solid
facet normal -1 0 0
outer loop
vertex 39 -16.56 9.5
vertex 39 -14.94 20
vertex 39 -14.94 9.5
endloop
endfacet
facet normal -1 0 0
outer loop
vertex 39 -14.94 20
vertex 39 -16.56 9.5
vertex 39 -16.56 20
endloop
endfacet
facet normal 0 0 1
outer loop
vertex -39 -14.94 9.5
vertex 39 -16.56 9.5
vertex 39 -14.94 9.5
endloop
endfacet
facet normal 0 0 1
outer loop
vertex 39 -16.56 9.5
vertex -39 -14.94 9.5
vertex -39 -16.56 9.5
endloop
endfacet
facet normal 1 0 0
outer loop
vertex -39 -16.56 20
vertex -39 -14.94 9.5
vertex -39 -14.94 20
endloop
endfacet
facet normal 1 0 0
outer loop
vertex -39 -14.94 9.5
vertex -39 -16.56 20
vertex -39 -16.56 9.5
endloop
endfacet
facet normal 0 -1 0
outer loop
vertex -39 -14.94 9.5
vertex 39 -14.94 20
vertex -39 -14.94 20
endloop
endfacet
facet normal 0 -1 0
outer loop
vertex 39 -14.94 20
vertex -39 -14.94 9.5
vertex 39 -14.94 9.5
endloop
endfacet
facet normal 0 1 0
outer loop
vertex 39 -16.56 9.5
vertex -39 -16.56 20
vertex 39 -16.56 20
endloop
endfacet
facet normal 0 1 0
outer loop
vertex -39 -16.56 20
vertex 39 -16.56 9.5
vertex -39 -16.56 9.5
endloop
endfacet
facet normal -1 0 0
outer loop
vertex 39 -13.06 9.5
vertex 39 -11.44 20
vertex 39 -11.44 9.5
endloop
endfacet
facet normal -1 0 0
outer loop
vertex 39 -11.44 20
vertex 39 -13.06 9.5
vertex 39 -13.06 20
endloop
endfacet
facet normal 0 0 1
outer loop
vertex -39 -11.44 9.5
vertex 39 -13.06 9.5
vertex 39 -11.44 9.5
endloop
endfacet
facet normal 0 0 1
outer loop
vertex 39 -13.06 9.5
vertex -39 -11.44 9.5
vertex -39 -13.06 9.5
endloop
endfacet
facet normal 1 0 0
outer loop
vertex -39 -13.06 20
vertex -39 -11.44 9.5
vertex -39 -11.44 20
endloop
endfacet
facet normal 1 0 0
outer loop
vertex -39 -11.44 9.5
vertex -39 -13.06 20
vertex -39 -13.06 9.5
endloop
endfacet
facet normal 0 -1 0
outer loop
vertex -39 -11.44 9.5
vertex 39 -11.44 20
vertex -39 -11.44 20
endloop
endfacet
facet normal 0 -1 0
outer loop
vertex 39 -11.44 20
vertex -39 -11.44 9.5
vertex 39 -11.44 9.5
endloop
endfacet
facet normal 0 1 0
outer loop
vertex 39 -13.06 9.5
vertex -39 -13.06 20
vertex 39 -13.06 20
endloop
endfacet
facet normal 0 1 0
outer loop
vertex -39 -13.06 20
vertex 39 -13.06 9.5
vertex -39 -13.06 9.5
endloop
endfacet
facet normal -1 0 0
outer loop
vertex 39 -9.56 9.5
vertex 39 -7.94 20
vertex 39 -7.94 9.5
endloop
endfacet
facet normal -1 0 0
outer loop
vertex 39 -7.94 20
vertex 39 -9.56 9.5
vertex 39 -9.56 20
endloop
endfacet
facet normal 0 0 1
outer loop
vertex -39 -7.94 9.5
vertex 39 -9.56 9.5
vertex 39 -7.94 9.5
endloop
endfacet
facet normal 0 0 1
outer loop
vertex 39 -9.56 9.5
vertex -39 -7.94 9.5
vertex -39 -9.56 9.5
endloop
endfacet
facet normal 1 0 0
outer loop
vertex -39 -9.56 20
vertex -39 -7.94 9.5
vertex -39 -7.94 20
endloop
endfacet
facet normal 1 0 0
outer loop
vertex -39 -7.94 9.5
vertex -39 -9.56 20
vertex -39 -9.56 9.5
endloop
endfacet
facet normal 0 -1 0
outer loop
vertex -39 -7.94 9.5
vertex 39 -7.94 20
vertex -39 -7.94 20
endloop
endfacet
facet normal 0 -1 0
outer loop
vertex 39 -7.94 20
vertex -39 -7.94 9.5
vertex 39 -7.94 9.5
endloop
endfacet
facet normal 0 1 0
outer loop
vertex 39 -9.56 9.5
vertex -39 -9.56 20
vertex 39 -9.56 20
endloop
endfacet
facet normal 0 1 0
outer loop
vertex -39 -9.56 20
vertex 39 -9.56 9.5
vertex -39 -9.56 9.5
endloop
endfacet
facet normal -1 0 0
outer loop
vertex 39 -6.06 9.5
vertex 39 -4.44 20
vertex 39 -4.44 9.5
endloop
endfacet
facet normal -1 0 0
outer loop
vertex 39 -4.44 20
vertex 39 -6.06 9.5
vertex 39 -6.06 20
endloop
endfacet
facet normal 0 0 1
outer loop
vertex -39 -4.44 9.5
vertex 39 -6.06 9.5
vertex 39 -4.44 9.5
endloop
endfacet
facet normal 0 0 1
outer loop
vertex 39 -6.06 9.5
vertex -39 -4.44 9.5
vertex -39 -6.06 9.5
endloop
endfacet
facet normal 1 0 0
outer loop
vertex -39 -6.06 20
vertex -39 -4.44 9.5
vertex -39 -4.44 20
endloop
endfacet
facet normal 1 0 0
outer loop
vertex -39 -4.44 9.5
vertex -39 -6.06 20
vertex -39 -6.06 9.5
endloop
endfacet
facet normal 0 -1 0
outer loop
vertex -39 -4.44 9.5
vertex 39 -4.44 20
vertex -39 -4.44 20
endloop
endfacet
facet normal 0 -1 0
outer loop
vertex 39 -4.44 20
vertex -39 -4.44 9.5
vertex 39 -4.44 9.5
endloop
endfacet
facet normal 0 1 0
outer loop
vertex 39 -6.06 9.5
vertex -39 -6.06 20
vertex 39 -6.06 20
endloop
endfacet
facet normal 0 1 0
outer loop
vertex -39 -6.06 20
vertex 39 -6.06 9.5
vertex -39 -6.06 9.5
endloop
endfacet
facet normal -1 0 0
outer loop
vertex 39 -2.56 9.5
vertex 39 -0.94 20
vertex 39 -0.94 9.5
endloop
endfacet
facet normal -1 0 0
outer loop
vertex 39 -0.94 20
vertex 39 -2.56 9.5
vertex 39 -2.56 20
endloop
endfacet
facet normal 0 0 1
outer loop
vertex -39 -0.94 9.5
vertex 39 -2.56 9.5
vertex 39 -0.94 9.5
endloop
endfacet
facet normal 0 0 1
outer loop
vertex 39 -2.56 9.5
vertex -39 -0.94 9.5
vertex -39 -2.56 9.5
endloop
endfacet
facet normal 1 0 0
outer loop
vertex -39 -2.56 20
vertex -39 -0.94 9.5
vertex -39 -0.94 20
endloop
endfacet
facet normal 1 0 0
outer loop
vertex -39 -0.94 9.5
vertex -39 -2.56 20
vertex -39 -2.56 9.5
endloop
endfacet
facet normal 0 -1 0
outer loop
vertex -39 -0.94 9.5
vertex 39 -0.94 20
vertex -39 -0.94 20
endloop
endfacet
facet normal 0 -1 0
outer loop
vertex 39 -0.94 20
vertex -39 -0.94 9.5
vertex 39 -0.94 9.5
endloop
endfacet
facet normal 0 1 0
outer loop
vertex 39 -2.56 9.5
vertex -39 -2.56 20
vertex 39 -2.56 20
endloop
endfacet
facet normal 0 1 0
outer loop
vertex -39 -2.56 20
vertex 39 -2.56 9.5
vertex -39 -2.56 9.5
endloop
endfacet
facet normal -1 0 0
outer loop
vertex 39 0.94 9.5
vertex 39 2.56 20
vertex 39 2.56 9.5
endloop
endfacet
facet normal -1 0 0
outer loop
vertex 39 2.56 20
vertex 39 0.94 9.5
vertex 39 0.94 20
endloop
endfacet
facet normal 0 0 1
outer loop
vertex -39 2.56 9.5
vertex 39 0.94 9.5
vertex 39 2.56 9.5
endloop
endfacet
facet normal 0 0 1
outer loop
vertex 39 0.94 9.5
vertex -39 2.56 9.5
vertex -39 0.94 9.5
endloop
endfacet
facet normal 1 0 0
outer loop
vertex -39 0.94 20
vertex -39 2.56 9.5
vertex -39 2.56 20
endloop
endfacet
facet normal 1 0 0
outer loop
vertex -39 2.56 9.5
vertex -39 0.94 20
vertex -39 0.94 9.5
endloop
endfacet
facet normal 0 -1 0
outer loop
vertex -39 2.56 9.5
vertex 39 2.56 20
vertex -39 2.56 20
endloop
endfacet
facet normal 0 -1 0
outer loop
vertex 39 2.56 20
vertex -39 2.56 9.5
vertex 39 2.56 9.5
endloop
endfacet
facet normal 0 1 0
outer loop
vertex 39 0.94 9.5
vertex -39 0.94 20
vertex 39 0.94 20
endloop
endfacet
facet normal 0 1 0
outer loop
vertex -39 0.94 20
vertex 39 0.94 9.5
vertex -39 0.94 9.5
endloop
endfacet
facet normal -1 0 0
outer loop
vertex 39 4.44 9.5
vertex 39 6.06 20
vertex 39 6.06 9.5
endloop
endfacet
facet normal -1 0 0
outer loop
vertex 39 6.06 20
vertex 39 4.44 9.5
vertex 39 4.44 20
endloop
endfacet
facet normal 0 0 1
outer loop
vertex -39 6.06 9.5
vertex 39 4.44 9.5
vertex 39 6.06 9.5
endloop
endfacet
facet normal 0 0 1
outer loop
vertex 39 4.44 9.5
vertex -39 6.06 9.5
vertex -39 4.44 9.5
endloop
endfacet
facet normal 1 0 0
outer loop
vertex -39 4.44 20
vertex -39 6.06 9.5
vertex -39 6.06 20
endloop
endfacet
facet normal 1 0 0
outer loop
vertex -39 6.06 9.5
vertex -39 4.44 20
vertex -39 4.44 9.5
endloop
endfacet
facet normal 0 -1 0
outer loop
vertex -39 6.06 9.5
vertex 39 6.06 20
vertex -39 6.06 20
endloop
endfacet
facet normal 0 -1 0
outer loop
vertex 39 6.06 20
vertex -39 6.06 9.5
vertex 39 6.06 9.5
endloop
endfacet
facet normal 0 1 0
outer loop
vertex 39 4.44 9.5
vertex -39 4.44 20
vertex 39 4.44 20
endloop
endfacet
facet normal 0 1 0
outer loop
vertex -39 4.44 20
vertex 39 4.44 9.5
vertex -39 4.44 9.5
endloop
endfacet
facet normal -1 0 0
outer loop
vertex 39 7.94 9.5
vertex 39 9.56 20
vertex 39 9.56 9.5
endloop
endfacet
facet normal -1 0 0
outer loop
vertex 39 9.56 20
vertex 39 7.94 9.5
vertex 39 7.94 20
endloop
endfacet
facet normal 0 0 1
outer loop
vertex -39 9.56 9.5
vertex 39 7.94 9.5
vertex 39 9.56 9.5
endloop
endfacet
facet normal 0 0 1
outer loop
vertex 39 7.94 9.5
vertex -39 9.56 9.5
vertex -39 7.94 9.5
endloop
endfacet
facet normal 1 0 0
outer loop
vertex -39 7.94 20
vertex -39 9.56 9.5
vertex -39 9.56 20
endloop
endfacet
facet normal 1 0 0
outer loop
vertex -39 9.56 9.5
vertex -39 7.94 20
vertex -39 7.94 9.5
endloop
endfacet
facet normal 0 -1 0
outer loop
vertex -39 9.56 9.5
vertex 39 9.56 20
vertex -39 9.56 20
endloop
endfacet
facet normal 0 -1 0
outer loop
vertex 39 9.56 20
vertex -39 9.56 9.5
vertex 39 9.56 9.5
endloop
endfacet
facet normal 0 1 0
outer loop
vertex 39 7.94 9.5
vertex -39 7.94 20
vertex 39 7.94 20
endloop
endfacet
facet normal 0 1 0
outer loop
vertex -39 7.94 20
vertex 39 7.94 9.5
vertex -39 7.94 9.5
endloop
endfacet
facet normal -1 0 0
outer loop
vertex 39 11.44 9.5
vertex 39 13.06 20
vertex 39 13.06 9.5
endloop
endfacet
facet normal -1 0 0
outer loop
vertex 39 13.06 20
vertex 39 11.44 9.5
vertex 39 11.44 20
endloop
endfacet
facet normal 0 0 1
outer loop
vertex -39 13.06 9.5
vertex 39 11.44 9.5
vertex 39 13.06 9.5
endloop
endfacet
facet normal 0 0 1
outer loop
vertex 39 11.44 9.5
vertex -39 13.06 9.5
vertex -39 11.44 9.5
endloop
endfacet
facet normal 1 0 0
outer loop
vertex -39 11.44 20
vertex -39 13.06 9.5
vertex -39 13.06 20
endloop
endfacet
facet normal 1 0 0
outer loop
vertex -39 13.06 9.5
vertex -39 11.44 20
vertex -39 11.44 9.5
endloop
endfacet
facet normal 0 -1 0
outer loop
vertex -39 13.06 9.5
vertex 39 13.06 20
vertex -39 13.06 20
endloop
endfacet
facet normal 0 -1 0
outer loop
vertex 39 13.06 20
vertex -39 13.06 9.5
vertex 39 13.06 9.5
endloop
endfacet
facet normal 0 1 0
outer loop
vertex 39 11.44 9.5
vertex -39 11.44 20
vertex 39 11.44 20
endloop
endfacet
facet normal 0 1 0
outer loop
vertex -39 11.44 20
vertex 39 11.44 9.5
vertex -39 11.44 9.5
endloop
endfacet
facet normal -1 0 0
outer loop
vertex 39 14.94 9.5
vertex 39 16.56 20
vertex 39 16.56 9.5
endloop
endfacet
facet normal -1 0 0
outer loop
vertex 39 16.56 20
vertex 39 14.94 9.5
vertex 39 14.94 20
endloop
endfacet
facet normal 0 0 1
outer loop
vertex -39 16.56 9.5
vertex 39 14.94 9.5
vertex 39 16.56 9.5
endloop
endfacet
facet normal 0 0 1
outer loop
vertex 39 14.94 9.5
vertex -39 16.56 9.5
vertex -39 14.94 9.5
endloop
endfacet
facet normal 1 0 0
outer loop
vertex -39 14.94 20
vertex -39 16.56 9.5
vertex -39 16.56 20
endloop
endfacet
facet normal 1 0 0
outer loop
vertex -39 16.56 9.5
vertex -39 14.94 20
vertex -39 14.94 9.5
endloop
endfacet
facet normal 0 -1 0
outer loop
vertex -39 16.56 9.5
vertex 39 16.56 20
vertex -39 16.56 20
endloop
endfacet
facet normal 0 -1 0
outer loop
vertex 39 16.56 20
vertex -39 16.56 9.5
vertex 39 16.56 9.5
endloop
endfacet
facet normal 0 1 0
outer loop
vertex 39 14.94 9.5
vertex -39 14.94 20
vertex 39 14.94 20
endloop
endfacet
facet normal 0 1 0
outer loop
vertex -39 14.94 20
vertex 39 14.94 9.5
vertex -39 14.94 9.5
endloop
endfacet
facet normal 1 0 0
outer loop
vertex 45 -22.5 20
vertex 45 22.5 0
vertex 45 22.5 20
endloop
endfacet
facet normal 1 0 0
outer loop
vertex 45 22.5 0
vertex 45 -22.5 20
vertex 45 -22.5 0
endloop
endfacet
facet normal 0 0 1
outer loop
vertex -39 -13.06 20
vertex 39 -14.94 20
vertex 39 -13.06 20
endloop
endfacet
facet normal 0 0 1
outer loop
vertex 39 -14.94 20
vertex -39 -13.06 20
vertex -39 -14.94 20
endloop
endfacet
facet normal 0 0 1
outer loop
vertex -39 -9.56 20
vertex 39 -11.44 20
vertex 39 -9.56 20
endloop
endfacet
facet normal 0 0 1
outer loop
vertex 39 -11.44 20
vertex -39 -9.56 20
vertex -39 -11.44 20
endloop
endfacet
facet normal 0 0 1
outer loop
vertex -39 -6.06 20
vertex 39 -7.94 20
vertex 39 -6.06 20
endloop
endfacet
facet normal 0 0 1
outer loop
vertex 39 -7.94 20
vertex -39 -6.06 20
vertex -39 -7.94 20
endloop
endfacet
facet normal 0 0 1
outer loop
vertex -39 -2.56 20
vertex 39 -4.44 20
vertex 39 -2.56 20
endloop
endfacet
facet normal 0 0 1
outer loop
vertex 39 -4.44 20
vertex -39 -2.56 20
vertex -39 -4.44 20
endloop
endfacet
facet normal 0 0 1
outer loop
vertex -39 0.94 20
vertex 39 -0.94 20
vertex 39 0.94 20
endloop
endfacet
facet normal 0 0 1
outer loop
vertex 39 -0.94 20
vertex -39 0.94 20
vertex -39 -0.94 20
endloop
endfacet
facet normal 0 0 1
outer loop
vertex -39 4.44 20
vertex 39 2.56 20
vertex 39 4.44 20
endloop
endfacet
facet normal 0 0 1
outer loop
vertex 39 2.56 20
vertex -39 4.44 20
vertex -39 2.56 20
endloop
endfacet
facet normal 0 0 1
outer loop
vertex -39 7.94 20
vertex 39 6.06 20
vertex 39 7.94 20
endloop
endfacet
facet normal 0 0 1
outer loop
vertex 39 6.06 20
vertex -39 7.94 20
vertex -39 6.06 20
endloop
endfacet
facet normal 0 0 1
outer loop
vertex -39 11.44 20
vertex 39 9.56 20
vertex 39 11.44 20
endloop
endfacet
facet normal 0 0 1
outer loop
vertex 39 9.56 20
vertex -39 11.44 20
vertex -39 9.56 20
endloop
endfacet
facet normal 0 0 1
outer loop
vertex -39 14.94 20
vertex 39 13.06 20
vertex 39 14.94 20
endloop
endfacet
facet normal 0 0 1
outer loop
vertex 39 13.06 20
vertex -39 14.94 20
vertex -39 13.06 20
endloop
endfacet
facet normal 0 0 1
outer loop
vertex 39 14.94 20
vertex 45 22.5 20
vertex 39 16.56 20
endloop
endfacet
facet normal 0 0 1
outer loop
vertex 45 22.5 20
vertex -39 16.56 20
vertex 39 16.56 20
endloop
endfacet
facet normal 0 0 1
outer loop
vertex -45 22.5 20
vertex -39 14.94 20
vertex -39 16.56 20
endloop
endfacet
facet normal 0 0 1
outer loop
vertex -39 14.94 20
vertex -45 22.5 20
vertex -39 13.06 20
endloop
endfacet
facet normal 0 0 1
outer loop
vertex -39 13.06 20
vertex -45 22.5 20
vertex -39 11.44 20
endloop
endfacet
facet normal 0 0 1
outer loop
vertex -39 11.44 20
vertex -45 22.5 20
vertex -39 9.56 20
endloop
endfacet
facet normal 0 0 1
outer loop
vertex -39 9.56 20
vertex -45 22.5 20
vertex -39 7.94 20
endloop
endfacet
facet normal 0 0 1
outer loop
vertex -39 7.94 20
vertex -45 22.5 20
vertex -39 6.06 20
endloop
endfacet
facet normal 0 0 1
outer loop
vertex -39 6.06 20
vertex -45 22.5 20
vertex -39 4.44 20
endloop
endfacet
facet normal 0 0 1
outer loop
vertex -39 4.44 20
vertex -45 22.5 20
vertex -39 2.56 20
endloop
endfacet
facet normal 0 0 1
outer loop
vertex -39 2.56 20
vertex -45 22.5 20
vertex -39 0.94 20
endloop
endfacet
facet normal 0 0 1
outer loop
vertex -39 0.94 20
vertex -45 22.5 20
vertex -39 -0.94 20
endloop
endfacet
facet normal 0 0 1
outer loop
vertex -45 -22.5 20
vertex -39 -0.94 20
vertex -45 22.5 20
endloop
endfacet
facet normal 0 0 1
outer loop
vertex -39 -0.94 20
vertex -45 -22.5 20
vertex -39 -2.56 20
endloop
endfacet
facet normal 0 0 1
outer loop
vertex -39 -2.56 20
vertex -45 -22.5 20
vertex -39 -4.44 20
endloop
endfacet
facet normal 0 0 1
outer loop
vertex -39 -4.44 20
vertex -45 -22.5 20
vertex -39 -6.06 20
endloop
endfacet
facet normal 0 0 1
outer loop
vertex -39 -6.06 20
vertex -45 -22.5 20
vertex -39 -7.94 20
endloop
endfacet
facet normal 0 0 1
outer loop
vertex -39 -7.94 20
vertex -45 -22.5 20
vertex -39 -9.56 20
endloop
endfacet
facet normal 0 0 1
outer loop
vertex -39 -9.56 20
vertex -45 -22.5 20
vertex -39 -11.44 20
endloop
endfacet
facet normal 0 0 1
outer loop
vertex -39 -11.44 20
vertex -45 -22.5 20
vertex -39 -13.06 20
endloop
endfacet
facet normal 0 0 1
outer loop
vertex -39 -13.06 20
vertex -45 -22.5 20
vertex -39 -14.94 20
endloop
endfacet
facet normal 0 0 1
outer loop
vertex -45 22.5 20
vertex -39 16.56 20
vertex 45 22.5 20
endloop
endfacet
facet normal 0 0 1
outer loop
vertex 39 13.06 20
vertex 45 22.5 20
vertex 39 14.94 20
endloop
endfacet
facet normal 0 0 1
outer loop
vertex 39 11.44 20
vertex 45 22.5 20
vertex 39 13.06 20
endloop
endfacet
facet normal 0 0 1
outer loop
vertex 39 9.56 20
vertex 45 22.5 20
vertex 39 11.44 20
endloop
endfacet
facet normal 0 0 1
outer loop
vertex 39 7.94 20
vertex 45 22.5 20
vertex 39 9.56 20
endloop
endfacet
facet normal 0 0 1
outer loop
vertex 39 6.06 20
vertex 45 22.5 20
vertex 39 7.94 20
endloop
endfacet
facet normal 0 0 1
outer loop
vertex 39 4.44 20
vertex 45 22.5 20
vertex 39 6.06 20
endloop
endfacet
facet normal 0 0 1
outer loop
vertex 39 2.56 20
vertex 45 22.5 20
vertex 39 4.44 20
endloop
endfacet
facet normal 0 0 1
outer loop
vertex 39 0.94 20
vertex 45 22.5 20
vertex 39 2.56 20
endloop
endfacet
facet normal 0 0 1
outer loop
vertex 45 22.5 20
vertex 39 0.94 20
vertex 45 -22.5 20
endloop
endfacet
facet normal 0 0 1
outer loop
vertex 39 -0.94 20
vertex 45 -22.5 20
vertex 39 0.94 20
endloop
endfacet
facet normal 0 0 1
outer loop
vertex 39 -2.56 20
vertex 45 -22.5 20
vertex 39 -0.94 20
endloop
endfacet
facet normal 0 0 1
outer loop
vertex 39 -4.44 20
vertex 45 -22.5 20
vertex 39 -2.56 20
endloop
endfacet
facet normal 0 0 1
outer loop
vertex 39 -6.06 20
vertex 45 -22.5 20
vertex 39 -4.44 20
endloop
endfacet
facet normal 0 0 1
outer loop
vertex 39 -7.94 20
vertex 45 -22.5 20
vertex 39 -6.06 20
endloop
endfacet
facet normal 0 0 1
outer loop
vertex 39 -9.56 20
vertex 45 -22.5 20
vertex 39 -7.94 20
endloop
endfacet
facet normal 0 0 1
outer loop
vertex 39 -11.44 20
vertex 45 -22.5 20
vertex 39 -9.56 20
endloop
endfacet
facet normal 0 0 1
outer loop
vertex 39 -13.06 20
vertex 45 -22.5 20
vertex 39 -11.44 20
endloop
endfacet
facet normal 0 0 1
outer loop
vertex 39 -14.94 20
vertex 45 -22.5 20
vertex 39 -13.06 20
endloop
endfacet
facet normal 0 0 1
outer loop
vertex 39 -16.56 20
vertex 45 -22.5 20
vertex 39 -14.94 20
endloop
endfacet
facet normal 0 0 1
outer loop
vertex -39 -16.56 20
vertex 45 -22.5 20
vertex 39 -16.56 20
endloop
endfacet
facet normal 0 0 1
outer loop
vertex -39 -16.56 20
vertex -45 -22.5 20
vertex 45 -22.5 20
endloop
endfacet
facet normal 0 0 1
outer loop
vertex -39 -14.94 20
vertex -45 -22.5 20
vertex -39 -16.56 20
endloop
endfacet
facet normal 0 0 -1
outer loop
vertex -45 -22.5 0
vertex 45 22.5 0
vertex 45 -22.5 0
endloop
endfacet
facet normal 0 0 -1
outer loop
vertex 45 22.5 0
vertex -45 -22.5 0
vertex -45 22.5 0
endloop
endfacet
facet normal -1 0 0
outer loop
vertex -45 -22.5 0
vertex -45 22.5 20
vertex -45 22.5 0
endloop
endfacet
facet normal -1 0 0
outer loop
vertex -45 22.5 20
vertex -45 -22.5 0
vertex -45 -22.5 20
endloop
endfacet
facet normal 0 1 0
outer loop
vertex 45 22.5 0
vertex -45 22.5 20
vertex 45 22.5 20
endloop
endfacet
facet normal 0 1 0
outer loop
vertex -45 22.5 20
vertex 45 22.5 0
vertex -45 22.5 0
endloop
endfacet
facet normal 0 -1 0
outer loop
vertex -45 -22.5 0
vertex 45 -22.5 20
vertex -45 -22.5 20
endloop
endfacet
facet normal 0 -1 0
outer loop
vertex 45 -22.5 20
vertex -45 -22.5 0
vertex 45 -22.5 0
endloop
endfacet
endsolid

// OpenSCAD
// Microscope slide drying rack

// Base block dimensions
base_length = 90;      // X dimension of base block (mm)
base_width = 45;       // Y dimension of base block (mm)
base_height = 20;      // Z dimension of base block (mm)

// Slot dimensions
slot_length = 77;      // Length of each slot along X (mm)
slot_width = 1.6;      // Width of each slot in Y direction (mm)
slot_depth = 10;       // Depth of each slot in Z direction (mm)

// Slot layout
num_slots = 10;        // Number of slots
slot_spacing = 3.5;    // Center-to-center spacing between slots in Y (mm)

// Derived dimensions
slot_group_span = (num_slots - 1) * slot_spacing;  // Total span of slot group in Y (31.5 mm)

$fn = 64;

difference() {
    // Create base block (centered at origin in X and Y, from z=0 to z=20)
    translate([0, 0, base_height/2]) {
        cube([base_length, base_width, base_height], center = true);
    }
    
    // Cut 10 parallel slots
    for (i = [0 : num_slots - 1]) {
        // Y position of current slot (centered in Y)
        slot_y = -slot_group_span / 2 + i * slot_spacing;
        
        // Remove slot with a cube that extends slightly past the boundaries
        translate([0, slot_y, base_height - slot_depth/2]) {
            cube([slot_length + 1, slot_width + 0.02, slot_depth + 1], center = true);
        }
    }
}
